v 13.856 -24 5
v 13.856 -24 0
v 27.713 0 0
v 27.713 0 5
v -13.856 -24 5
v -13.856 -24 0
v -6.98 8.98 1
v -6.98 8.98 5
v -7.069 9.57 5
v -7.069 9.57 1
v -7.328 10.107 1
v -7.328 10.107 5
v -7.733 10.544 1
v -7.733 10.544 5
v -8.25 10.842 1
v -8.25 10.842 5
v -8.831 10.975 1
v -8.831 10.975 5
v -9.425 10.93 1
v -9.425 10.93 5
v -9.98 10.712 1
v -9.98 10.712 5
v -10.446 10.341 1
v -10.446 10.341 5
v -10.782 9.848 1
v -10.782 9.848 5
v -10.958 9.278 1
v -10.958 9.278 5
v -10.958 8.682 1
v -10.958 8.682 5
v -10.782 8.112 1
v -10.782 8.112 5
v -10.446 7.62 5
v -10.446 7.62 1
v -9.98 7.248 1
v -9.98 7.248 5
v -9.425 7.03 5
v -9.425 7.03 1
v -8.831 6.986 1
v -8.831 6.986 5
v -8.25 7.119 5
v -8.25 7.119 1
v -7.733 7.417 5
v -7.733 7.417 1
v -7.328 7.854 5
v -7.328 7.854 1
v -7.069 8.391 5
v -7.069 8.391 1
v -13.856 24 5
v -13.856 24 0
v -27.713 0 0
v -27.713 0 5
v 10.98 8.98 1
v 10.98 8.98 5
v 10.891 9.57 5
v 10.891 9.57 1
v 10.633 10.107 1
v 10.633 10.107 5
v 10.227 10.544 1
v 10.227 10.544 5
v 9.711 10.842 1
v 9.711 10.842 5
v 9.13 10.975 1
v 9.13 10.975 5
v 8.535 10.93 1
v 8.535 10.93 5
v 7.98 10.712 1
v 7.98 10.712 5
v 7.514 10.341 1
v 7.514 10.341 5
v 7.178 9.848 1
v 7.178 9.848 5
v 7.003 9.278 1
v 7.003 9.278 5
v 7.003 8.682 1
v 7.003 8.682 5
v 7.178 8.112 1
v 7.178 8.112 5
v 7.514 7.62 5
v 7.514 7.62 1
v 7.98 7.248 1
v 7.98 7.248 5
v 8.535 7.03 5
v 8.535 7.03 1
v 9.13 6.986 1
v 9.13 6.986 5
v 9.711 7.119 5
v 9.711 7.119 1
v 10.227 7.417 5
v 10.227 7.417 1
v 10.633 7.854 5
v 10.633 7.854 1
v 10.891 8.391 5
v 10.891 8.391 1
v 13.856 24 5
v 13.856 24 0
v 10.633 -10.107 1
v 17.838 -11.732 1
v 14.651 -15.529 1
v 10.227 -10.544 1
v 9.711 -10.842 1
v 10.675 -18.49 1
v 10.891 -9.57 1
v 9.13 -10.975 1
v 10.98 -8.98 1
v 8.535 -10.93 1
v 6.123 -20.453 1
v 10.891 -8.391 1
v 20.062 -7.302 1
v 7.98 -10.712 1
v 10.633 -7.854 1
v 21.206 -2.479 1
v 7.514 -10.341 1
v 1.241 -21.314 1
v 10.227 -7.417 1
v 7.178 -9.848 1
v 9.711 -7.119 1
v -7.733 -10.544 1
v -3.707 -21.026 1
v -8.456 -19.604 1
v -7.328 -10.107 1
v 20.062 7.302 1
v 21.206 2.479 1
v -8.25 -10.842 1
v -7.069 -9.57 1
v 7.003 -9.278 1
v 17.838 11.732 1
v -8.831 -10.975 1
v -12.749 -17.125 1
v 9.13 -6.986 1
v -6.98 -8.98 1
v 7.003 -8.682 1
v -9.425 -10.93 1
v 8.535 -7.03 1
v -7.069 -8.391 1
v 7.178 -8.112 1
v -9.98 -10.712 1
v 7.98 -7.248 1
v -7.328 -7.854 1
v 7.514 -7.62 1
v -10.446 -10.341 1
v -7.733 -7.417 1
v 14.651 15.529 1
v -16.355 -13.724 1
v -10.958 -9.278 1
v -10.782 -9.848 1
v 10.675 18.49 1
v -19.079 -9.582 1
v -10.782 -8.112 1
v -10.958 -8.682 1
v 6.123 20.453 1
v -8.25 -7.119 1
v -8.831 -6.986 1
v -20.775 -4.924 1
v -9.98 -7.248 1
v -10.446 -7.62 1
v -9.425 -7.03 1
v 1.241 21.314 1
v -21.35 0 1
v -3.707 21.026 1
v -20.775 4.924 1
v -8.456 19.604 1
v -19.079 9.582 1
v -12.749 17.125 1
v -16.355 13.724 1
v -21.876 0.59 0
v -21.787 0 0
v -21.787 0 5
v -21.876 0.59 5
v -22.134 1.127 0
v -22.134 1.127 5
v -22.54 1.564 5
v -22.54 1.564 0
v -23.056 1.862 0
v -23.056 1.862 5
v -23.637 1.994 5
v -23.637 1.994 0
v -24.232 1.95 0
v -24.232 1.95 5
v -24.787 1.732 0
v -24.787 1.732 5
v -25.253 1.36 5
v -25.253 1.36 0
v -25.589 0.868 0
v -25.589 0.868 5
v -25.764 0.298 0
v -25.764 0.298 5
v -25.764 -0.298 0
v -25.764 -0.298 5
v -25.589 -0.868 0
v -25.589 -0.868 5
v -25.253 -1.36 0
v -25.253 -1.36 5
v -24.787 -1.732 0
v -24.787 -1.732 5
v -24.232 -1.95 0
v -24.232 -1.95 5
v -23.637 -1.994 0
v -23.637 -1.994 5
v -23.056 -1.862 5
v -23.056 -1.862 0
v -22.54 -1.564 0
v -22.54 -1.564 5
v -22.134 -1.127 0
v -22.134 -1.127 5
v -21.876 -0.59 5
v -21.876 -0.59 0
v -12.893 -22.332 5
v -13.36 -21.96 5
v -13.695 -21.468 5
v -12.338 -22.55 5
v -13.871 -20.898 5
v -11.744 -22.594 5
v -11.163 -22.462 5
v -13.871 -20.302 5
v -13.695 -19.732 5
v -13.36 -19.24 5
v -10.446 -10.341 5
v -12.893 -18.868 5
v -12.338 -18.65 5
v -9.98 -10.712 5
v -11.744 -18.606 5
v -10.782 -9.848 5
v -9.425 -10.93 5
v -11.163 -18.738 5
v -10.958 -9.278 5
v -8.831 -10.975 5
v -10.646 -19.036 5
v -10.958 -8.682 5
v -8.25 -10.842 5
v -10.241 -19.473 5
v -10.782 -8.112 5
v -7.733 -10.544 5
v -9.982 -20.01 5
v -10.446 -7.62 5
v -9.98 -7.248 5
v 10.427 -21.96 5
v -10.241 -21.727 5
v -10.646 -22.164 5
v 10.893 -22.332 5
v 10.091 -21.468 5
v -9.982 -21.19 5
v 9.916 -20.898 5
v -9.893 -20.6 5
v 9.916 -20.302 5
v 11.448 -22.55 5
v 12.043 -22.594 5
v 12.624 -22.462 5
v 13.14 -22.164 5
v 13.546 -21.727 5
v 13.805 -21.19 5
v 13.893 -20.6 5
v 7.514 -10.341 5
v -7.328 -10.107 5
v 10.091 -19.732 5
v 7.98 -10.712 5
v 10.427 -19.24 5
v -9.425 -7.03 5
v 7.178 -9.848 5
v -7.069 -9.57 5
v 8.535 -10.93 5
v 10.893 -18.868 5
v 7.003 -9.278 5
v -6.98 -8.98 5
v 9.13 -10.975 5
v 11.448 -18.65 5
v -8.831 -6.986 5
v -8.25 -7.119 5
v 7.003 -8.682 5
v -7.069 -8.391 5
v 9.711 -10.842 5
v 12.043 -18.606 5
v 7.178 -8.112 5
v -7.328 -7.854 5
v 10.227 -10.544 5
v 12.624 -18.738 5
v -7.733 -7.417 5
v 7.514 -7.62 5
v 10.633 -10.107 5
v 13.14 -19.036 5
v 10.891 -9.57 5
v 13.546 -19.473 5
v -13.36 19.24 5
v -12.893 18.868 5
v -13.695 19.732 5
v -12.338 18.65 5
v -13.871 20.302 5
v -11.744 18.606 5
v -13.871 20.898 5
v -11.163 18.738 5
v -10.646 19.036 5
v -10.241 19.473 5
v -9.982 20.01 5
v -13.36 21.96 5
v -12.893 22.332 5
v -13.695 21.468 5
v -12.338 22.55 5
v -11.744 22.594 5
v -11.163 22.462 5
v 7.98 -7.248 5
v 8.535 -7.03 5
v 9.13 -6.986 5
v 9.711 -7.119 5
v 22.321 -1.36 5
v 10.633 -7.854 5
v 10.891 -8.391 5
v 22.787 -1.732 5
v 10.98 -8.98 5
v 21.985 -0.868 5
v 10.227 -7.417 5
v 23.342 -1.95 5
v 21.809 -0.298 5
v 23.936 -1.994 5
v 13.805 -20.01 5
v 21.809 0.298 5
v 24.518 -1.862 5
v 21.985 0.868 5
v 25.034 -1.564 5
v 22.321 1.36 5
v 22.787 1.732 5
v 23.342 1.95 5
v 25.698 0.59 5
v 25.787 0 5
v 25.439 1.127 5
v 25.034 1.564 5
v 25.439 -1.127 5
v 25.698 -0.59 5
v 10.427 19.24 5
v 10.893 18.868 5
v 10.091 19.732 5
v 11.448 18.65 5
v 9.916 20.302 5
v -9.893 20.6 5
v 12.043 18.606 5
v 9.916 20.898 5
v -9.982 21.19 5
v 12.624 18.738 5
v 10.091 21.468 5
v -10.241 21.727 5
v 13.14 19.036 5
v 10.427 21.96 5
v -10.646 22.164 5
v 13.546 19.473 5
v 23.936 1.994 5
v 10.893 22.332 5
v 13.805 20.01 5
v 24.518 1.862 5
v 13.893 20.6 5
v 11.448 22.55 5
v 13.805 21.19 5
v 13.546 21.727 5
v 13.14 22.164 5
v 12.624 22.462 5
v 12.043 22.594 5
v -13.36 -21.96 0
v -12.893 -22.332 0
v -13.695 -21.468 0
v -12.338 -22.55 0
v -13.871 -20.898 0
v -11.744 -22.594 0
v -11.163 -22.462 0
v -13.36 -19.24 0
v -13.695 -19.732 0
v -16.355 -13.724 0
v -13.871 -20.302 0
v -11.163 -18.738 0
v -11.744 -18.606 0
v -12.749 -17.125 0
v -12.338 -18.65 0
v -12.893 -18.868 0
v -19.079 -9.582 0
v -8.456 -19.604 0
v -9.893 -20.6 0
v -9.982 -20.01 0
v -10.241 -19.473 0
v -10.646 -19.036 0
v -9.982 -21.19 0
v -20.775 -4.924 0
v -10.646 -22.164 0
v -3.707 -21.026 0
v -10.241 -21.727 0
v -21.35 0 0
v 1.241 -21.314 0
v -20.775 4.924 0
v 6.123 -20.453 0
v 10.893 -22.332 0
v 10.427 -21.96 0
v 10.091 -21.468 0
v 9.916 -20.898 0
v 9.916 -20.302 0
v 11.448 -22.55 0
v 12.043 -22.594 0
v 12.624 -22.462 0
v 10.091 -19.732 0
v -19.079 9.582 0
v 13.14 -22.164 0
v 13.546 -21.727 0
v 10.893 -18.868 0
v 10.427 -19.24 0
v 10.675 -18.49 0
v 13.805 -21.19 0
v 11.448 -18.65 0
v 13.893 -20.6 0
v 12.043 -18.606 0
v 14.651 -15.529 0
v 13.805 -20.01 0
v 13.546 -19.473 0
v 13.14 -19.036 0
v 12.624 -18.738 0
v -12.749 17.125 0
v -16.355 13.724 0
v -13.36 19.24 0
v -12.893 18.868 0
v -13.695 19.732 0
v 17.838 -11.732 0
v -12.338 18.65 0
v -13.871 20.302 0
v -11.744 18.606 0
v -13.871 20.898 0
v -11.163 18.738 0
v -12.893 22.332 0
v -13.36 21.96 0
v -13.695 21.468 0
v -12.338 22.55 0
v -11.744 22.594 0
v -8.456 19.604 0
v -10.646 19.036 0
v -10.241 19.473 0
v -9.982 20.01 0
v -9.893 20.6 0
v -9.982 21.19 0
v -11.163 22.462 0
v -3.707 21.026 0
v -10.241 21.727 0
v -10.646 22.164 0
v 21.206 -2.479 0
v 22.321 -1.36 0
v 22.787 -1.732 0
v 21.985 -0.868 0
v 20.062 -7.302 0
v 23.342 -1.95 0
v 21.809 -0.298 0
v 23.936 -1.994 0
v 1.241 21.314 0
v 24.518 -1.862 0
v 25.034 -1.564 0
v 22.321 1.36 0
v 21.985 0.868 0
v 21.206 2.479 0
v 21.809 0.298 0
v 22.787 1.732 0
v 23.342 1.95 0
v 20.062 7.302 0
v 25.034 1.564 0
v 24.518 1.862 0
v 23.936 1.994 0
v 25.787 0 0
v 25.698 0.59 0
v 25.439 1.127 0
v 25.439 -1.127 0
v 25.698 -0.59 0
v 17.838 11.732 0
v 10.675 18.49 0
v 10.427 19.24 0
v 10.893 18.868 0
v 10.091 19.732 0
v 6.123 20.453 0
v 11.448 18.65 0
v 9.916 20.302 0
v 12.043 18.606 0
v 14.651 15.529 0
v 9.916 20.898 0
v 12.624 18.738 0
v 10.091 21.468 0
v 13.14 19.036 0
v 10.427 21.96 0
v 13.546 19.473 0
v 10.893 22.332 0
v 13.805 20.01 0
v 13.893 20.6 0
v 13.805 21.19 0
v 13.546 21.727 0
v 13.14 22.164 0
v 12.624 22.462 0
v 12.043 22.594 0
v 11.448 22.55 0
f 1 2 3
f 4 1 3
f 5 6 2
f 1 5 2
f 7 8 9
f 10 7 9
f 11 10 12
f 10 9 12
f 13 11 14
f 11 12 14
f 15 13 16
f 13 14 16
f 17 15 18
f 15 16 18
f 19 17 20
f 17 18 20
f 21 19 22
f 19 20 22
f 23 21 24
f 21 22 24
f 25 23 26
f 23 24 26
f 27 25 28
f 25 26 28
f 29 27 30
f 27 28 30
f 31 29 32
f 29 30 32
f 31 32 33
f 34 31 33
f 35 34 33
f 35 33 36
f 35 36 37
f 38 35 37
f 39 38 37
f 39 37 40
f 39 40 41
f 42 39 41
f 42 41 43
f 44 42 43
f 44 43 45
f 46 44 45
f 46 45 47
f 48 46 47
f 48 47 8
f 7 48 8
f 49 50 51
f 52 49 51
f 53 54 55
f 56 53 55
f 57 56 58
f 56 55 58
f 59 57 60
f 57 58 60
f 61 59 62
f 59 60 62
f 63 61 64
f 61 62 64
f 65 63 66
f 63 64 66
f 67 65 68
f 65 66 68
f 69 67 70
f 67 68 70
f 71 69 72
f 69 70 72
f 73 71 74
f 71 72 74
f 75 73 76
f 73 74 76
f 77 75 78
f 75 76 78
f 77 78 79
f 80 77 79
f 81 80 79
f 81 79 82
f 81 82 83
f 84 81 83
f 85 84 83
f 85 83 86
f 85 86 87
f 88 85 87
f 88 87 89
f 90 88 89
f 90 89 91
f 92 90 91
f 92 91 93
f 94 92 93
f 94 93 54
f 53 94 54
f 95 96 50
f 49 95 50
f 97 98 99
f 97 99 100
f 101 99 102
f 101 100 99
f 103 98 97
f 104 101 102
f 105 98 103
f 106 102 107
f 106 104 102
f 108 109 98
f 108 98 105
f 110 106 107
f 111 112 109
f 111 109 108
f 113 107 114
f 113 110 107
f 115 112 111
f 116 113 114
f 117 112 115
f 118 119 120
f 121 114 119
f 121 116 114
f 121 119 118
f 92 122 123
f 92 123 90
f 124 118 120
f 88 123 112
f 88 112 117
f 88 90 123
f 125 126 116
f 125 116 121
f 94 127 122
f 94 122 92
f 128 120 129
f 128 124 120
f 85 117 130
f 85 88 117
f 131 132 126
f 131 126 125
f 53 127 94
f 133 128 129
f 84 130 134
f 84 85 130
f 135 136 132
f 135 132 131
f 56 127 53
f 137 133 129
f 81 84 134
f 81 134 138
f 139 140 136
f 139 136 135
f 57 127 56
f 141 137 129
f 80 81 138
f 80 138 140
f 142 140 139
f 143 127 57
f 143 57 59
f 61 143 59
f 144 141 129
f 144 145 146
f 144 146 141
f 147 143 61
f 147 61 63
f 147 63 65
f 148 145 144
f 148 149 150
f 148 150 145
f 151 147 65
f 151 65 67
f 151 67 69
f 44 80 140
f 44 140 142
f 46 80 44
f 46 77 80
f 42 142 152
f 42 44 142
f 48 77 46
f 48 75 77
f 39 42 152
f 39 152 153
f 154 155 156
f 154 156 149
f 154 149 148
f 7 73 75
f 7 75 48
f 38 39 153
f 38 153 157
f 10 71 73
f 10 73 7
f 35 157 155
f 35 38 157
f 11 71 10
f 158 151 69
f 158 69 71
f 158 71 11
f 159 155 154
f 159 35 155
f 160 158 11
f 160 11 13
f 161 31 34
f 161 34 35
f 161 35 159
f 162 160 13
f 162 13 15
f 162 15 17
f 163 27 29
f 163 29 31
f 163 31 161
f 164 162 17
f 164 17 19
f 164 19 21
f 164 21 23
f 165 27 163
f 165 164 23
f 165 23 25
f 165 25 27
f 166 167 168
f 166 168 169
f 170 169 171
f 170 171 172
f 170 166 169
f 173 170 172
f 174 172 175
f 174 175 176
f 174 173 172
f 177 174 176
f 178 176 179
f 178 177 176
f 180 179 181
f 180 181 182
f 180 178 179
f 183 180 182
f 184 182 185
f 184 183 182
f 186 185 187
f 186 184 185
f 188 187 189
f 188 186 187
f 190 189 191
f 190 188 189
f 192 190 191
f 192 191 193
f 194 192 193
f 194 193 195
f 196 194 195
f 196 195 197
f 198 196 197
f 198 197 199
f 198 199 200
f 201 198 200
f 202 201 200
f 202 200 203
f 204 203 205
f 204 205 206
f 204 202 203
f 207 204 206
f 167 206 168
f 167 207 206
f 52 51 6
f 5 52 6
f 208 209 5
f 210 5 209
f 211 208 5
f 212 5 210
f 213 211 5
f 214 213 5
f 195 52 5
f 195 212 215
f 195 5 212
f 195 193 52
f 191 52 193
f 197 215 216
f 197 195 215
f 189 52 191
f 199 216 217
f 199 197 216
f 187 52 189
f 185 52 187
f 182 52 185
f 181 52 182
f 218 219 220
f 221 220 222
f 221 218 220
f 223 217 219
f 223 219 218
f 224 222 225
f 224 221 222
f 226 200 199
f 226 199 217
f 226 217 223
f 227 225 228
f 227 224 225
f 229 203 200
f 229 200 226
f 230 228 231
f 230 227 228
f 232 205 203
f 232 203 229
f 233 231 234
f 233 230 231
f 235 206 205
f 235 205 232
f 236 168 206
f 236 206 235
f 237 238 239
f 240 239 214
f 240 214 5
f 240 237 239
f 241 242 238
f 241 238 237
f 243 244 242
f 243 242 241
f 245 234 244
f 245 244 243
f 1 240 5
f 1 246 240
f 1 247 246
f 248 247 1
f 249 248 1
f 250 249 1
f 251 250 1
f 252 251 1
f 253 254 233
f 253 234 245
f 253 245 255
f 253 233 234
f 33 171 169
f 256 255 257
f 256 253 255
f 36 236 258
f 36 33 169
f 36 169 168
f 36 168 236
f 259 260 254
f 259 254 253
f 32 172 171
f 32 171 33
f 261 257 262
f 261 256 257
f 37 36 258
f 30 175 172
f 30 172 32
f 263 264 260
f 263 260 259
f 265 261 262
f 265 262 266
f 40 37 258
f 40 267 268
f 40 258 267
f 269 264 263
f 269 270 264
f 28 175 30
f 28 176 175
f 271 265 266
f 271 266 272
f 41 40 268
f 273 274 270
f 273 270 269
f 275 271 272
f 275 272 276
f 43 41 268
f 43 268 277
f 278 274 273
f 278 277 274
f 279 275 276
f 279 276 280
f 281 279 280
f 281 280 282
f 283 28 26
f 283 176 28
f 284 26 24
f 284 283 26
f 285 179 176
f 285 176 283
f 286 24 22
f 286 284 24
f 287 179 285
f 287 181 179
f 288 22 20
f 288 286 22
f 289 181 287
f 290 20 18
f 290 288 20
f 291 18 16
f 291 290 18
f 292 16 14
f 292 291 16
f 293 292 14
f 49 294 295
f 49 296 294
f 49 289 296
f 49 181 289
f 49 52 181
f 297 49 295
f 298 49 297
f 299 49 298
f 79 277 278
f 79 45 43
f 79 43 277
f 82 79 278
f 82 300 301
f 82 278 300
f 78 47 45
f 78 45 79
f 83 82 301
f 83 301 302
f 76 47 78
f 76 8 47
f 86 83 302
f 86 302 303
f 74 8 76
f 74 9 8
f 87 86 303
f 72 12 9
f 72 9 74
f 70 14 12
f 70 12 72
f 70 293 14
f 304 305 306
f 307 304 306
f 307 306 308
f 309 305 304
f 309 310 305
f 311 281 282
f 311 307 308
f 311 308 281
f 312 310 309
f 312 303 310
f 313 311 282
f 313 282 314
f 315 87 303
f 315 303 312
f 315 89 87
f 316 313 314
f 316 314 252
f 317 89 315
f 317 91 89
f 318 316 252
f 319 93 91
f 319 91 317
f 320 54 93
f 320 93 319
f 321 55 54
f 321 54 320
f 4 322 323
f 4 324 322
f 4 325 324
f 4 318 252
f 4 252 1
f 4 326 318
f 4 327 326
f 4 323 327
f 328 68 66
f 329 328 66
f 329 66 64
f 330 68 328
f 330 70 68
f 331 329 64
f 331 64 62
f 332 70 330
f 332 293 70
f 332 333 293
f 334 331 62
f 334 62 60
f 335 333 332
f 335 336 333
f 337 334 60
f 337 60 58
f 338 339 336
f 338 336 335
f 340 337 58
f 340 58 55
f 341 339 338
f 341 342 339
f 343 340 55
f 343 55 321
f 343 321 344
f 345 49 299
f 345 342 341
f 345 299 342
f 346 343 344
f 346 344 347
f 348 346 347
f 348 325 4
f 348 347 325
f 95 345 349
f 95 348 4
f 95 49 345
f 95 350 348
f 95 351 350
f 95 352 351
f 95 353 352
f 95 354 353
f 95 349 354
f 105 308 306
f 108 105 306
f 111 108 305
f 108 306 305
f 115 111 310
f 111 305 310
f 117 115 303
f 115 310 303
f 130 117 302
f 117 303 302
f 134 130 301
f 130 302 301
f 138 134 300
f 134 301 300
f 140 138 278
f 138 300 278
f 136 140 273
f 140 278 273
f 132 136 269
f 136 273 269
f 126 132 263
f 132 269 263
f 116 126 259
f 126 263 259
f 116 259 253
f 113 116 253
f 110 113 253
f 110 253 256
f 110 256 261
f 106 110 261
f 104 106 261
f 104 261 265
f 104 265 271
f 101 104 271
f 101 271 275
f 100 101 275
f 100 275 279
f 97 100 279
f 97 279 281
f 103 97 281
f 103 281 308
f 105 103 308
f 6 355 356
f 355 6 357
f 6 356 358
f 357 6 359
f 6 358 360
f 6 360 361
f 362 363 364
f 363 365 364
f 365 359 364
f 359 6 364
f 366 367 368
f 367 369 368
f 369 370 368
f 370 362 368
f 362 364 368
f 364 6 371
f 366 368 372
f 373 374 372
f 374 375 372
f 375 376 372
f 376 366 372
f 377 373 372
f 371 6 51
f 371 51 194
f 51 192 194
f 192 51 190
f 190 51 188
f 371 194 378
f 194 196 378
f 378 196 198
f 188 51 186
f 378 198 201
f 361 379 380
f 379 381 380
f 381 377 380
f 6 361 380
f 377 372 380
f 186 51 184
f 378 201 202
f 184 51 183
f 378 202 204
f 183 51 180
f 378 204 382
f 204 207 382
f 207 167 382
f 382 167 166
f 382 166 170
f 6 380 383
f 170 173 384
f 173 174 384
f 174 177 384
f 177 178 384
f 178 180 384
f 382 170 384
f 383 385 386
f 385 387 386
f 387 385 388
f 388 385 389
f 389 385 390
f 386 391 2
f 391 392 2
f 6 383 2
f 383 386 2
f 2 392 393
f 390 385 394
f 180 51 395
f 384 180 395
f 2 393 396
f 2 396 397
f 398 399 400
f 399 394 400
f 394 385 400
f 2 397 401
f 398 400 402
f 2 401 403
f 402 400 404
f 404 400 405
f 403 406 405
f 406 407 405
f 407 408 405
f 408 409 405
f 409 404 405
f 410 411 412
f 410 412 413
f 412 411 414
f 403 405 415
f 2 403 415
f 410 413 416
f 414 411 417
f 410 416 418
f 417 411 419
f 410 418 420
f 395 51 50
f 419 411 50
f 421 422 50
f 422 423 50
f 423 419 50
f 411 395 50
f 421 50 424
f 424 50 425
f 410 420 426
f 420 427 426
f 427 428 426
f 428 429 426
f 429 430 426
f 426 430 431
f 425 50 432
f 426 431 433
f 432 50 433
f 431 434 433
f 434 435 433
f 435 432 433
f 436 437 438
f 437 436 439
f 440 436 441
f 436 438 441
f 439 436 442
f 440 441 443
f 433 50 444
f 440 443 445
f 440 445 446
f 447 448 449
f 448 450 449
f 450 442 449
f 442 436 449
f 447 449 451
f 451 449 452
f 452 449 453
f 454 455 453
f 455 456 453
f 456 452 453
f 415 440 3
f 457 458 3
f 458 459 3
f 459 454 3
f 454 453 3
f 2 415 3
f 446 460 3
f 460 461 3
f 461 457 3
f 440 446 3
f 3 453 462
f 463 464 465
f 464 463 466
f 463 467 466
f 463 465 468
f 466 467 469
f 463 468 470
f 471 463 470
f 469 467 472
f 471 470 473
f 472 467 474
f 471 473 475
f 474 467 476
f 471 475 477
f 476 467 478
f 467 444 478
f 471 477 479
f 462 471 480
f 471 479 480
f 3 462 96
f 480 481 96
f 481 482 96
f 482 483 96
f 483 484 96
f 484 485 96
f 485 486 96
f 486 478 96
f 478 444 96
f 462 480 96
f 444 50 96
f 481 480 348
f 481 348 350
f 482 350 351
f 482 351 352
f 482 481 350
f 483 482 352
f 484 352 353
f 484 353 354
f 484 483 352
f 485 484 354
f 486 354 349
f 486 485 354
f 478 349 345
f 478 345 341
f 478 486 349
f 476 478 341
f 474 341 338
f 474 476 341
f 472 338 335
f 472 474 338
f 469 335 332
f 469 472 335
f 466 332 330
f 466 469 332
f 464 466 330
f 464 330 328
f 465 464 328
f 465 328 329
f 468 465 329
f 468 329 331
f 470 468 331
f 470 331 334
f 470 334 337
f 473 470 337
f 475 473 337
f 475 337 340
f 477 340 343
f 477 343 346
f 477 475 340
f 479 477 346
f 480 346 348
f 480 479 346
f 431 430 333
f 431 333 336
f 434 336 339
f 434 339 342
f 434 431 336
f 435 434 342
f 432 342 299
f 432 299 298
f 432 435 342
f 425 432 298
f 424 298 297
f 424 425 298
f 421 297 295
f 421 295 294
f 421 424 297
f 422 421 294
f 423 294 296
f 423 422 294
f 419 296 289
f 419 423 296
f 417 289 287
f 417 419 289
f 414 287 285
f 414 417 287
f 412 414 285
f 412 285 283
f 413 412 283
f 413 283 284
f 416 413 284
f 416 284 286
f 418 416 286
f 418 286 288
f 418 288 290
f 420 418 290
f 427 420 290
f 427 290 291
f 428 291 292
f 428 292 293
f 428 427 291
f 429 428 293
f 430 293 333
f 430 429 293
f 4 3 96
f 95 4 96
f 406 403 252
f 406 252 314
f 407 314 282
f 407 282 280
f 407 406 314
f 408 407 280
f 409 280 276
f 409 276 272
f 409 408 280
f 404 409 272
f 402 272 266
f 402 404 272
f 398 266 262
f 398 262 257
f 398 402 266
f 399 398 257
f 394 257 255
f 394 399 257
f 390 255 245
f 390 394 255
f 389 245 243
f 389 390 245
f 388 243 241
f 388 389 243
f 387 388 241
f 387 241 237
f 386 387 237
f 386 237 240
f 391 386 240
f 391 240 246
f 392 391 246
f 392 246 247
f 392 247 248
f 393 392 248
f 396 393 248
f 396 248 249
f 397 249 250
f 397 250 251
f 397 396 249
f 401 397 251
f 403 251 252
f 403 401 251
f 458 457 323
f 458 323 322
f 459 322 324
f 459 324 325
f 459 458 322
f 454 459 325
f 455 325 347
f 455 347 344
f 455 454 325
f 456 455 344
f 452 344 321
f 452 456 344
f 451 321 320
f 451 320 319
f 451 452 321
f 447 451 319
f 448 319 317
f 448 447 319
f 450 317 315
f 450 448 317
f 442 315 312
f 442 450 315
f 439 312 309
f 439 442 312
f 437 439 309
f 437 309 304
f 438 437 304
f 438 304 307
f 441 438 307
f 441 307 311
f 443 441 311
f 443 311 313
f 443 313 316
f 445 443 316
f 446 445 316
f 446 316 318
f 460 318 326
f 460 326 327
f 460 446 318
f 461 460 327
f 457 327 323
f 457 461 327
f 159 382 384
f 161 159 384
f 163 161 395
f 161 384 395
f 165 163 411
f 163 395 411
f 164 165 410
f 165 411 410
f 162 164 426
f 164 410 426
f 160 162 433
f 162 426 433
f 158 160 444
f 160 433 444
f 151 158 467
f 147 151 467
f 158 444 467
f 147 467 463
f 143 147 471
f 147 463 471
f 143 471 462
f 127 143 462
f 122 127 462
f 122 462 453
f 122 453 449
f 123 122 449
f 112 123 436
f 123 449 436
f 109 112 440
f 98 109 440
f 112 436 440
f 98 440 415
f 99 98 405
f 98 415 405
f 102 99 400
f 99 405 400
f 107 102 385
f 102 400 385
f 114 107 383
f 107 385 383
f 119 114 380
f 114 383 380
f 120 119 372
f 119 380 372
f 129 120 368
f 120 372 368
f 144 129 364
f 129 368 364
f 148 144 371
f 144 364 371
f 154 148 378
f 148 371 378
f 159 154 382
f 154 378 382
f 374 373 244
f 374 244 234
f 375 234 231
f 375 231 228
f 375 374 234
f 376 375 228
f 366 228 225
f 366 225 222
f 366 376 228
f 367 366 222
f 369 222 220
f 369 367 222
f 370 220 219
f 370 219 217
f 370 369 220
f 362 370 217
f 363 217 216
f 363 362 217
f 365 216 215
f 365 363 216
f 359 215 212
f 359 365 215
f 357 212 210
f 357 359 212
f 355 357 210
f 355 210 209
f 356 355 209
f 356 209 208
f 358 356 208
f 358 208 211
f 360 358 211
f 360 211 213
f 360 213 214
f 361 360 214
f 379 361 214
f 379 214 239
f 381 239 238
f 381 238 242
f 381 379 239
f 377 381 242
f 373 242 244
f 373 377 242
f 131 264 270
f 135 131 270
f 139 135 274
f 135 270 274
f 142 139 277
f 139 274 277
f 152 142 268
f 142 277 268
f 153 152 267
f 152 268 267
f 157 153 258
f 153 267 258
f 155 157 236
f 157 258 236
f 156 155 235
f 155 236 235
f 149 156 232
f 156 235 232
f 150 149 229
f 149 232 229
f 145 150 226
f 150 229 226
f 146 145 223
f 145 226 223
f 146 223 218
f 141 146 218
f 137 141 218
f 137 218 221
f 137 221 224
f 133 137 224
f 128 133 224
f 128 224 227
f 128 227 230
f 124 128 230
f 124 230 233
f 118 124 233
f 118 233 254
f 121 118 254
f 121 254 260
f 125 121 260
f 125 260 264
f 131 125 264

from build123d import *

# Parameters (mm, degrees)
EXTRUDE_1_DEPTH     = 5
SKETCH_11_R         = 21.35
CUT_EXTRUDE_1_DEPTH = 1
F_4_0MM_2_D         = 4
F_4_0MM_3_OUTLINE_R = 2
F_4_0MM_3_DEPTH     = 5


# Read off the part's stored shape, not the designer's step: Ø4.0mm 暗销孔3
with BuildPart() as part:
    # 草图2 → 凸台-拉伸1 (new body)
    with BuildSketch(Plane.XY):
        Polygon((-13.856406461, 24), (-27.712812921, 0), (-13.856406461, -24), (13.856406461, -24), (27.712812921, 0), (13.856406461, 24), align=None)
    extrude(amount=EXTRUDE_1_DEPTH)

    # 草图11 → 切除-拉伸1 (cut)
    with BuildSketch(Plane(origin=(0, 0, 0), x_dir=(-1, 0, 0), z_dir=(0, 0, -1))):
        Circle(SKETCH_11_R)
    extrude(amount=-CUT_EXTRUDE_1_DEPTH, mode=Mode.SUBTRACT)

    # Ø4.0mm 暗销孔2 (through all)
    with Locations(Plane(origin=(0, 0, 1), x_dir=(-1, 0, 0), z_dir=(0, 0, -1))):
        with Locations((8.980256121, 8.980256121), (-8.980256121, 8.980256121), (-8.980256121, -8.980256121), (8.980256121, -8.980256121)):
            Hole(F_4_0MM_2_D / 2)

    # Ø4.0mm 暗销孔3 outline → Ø4.0mm 暗销孔3 (cut)
    with BuildSketch(Plane.XY):
        with Locations((23.786831091, 0)):
            Circle(F_4_0MM_3_OUTLINE_R)
        with Locations((-11.893415545, -20.6)):
            Circle(F_4_0MM_3_OUTLINE_R)
        with Locations((11.893415545, -20.6)):
            Circle(F_4_0MM_3_OUTLINE_R)
        with Locations((-23.786831091, 0)):
            Circle(F_4_0MM_3_OUTLINE_R)
        with Locations((-11.893415545, 20.6)):
            Circle(F_4_0MM_3_OUTLINE_R)
        with Locations((11.893415545, 20.6)):
            Circle(F_4_0MM_3_OUTLINE_R)
    extrude(amount=F_4_0MM_3_DEPTH, mode=Mode.SUBTRACT)


solid = part.part
